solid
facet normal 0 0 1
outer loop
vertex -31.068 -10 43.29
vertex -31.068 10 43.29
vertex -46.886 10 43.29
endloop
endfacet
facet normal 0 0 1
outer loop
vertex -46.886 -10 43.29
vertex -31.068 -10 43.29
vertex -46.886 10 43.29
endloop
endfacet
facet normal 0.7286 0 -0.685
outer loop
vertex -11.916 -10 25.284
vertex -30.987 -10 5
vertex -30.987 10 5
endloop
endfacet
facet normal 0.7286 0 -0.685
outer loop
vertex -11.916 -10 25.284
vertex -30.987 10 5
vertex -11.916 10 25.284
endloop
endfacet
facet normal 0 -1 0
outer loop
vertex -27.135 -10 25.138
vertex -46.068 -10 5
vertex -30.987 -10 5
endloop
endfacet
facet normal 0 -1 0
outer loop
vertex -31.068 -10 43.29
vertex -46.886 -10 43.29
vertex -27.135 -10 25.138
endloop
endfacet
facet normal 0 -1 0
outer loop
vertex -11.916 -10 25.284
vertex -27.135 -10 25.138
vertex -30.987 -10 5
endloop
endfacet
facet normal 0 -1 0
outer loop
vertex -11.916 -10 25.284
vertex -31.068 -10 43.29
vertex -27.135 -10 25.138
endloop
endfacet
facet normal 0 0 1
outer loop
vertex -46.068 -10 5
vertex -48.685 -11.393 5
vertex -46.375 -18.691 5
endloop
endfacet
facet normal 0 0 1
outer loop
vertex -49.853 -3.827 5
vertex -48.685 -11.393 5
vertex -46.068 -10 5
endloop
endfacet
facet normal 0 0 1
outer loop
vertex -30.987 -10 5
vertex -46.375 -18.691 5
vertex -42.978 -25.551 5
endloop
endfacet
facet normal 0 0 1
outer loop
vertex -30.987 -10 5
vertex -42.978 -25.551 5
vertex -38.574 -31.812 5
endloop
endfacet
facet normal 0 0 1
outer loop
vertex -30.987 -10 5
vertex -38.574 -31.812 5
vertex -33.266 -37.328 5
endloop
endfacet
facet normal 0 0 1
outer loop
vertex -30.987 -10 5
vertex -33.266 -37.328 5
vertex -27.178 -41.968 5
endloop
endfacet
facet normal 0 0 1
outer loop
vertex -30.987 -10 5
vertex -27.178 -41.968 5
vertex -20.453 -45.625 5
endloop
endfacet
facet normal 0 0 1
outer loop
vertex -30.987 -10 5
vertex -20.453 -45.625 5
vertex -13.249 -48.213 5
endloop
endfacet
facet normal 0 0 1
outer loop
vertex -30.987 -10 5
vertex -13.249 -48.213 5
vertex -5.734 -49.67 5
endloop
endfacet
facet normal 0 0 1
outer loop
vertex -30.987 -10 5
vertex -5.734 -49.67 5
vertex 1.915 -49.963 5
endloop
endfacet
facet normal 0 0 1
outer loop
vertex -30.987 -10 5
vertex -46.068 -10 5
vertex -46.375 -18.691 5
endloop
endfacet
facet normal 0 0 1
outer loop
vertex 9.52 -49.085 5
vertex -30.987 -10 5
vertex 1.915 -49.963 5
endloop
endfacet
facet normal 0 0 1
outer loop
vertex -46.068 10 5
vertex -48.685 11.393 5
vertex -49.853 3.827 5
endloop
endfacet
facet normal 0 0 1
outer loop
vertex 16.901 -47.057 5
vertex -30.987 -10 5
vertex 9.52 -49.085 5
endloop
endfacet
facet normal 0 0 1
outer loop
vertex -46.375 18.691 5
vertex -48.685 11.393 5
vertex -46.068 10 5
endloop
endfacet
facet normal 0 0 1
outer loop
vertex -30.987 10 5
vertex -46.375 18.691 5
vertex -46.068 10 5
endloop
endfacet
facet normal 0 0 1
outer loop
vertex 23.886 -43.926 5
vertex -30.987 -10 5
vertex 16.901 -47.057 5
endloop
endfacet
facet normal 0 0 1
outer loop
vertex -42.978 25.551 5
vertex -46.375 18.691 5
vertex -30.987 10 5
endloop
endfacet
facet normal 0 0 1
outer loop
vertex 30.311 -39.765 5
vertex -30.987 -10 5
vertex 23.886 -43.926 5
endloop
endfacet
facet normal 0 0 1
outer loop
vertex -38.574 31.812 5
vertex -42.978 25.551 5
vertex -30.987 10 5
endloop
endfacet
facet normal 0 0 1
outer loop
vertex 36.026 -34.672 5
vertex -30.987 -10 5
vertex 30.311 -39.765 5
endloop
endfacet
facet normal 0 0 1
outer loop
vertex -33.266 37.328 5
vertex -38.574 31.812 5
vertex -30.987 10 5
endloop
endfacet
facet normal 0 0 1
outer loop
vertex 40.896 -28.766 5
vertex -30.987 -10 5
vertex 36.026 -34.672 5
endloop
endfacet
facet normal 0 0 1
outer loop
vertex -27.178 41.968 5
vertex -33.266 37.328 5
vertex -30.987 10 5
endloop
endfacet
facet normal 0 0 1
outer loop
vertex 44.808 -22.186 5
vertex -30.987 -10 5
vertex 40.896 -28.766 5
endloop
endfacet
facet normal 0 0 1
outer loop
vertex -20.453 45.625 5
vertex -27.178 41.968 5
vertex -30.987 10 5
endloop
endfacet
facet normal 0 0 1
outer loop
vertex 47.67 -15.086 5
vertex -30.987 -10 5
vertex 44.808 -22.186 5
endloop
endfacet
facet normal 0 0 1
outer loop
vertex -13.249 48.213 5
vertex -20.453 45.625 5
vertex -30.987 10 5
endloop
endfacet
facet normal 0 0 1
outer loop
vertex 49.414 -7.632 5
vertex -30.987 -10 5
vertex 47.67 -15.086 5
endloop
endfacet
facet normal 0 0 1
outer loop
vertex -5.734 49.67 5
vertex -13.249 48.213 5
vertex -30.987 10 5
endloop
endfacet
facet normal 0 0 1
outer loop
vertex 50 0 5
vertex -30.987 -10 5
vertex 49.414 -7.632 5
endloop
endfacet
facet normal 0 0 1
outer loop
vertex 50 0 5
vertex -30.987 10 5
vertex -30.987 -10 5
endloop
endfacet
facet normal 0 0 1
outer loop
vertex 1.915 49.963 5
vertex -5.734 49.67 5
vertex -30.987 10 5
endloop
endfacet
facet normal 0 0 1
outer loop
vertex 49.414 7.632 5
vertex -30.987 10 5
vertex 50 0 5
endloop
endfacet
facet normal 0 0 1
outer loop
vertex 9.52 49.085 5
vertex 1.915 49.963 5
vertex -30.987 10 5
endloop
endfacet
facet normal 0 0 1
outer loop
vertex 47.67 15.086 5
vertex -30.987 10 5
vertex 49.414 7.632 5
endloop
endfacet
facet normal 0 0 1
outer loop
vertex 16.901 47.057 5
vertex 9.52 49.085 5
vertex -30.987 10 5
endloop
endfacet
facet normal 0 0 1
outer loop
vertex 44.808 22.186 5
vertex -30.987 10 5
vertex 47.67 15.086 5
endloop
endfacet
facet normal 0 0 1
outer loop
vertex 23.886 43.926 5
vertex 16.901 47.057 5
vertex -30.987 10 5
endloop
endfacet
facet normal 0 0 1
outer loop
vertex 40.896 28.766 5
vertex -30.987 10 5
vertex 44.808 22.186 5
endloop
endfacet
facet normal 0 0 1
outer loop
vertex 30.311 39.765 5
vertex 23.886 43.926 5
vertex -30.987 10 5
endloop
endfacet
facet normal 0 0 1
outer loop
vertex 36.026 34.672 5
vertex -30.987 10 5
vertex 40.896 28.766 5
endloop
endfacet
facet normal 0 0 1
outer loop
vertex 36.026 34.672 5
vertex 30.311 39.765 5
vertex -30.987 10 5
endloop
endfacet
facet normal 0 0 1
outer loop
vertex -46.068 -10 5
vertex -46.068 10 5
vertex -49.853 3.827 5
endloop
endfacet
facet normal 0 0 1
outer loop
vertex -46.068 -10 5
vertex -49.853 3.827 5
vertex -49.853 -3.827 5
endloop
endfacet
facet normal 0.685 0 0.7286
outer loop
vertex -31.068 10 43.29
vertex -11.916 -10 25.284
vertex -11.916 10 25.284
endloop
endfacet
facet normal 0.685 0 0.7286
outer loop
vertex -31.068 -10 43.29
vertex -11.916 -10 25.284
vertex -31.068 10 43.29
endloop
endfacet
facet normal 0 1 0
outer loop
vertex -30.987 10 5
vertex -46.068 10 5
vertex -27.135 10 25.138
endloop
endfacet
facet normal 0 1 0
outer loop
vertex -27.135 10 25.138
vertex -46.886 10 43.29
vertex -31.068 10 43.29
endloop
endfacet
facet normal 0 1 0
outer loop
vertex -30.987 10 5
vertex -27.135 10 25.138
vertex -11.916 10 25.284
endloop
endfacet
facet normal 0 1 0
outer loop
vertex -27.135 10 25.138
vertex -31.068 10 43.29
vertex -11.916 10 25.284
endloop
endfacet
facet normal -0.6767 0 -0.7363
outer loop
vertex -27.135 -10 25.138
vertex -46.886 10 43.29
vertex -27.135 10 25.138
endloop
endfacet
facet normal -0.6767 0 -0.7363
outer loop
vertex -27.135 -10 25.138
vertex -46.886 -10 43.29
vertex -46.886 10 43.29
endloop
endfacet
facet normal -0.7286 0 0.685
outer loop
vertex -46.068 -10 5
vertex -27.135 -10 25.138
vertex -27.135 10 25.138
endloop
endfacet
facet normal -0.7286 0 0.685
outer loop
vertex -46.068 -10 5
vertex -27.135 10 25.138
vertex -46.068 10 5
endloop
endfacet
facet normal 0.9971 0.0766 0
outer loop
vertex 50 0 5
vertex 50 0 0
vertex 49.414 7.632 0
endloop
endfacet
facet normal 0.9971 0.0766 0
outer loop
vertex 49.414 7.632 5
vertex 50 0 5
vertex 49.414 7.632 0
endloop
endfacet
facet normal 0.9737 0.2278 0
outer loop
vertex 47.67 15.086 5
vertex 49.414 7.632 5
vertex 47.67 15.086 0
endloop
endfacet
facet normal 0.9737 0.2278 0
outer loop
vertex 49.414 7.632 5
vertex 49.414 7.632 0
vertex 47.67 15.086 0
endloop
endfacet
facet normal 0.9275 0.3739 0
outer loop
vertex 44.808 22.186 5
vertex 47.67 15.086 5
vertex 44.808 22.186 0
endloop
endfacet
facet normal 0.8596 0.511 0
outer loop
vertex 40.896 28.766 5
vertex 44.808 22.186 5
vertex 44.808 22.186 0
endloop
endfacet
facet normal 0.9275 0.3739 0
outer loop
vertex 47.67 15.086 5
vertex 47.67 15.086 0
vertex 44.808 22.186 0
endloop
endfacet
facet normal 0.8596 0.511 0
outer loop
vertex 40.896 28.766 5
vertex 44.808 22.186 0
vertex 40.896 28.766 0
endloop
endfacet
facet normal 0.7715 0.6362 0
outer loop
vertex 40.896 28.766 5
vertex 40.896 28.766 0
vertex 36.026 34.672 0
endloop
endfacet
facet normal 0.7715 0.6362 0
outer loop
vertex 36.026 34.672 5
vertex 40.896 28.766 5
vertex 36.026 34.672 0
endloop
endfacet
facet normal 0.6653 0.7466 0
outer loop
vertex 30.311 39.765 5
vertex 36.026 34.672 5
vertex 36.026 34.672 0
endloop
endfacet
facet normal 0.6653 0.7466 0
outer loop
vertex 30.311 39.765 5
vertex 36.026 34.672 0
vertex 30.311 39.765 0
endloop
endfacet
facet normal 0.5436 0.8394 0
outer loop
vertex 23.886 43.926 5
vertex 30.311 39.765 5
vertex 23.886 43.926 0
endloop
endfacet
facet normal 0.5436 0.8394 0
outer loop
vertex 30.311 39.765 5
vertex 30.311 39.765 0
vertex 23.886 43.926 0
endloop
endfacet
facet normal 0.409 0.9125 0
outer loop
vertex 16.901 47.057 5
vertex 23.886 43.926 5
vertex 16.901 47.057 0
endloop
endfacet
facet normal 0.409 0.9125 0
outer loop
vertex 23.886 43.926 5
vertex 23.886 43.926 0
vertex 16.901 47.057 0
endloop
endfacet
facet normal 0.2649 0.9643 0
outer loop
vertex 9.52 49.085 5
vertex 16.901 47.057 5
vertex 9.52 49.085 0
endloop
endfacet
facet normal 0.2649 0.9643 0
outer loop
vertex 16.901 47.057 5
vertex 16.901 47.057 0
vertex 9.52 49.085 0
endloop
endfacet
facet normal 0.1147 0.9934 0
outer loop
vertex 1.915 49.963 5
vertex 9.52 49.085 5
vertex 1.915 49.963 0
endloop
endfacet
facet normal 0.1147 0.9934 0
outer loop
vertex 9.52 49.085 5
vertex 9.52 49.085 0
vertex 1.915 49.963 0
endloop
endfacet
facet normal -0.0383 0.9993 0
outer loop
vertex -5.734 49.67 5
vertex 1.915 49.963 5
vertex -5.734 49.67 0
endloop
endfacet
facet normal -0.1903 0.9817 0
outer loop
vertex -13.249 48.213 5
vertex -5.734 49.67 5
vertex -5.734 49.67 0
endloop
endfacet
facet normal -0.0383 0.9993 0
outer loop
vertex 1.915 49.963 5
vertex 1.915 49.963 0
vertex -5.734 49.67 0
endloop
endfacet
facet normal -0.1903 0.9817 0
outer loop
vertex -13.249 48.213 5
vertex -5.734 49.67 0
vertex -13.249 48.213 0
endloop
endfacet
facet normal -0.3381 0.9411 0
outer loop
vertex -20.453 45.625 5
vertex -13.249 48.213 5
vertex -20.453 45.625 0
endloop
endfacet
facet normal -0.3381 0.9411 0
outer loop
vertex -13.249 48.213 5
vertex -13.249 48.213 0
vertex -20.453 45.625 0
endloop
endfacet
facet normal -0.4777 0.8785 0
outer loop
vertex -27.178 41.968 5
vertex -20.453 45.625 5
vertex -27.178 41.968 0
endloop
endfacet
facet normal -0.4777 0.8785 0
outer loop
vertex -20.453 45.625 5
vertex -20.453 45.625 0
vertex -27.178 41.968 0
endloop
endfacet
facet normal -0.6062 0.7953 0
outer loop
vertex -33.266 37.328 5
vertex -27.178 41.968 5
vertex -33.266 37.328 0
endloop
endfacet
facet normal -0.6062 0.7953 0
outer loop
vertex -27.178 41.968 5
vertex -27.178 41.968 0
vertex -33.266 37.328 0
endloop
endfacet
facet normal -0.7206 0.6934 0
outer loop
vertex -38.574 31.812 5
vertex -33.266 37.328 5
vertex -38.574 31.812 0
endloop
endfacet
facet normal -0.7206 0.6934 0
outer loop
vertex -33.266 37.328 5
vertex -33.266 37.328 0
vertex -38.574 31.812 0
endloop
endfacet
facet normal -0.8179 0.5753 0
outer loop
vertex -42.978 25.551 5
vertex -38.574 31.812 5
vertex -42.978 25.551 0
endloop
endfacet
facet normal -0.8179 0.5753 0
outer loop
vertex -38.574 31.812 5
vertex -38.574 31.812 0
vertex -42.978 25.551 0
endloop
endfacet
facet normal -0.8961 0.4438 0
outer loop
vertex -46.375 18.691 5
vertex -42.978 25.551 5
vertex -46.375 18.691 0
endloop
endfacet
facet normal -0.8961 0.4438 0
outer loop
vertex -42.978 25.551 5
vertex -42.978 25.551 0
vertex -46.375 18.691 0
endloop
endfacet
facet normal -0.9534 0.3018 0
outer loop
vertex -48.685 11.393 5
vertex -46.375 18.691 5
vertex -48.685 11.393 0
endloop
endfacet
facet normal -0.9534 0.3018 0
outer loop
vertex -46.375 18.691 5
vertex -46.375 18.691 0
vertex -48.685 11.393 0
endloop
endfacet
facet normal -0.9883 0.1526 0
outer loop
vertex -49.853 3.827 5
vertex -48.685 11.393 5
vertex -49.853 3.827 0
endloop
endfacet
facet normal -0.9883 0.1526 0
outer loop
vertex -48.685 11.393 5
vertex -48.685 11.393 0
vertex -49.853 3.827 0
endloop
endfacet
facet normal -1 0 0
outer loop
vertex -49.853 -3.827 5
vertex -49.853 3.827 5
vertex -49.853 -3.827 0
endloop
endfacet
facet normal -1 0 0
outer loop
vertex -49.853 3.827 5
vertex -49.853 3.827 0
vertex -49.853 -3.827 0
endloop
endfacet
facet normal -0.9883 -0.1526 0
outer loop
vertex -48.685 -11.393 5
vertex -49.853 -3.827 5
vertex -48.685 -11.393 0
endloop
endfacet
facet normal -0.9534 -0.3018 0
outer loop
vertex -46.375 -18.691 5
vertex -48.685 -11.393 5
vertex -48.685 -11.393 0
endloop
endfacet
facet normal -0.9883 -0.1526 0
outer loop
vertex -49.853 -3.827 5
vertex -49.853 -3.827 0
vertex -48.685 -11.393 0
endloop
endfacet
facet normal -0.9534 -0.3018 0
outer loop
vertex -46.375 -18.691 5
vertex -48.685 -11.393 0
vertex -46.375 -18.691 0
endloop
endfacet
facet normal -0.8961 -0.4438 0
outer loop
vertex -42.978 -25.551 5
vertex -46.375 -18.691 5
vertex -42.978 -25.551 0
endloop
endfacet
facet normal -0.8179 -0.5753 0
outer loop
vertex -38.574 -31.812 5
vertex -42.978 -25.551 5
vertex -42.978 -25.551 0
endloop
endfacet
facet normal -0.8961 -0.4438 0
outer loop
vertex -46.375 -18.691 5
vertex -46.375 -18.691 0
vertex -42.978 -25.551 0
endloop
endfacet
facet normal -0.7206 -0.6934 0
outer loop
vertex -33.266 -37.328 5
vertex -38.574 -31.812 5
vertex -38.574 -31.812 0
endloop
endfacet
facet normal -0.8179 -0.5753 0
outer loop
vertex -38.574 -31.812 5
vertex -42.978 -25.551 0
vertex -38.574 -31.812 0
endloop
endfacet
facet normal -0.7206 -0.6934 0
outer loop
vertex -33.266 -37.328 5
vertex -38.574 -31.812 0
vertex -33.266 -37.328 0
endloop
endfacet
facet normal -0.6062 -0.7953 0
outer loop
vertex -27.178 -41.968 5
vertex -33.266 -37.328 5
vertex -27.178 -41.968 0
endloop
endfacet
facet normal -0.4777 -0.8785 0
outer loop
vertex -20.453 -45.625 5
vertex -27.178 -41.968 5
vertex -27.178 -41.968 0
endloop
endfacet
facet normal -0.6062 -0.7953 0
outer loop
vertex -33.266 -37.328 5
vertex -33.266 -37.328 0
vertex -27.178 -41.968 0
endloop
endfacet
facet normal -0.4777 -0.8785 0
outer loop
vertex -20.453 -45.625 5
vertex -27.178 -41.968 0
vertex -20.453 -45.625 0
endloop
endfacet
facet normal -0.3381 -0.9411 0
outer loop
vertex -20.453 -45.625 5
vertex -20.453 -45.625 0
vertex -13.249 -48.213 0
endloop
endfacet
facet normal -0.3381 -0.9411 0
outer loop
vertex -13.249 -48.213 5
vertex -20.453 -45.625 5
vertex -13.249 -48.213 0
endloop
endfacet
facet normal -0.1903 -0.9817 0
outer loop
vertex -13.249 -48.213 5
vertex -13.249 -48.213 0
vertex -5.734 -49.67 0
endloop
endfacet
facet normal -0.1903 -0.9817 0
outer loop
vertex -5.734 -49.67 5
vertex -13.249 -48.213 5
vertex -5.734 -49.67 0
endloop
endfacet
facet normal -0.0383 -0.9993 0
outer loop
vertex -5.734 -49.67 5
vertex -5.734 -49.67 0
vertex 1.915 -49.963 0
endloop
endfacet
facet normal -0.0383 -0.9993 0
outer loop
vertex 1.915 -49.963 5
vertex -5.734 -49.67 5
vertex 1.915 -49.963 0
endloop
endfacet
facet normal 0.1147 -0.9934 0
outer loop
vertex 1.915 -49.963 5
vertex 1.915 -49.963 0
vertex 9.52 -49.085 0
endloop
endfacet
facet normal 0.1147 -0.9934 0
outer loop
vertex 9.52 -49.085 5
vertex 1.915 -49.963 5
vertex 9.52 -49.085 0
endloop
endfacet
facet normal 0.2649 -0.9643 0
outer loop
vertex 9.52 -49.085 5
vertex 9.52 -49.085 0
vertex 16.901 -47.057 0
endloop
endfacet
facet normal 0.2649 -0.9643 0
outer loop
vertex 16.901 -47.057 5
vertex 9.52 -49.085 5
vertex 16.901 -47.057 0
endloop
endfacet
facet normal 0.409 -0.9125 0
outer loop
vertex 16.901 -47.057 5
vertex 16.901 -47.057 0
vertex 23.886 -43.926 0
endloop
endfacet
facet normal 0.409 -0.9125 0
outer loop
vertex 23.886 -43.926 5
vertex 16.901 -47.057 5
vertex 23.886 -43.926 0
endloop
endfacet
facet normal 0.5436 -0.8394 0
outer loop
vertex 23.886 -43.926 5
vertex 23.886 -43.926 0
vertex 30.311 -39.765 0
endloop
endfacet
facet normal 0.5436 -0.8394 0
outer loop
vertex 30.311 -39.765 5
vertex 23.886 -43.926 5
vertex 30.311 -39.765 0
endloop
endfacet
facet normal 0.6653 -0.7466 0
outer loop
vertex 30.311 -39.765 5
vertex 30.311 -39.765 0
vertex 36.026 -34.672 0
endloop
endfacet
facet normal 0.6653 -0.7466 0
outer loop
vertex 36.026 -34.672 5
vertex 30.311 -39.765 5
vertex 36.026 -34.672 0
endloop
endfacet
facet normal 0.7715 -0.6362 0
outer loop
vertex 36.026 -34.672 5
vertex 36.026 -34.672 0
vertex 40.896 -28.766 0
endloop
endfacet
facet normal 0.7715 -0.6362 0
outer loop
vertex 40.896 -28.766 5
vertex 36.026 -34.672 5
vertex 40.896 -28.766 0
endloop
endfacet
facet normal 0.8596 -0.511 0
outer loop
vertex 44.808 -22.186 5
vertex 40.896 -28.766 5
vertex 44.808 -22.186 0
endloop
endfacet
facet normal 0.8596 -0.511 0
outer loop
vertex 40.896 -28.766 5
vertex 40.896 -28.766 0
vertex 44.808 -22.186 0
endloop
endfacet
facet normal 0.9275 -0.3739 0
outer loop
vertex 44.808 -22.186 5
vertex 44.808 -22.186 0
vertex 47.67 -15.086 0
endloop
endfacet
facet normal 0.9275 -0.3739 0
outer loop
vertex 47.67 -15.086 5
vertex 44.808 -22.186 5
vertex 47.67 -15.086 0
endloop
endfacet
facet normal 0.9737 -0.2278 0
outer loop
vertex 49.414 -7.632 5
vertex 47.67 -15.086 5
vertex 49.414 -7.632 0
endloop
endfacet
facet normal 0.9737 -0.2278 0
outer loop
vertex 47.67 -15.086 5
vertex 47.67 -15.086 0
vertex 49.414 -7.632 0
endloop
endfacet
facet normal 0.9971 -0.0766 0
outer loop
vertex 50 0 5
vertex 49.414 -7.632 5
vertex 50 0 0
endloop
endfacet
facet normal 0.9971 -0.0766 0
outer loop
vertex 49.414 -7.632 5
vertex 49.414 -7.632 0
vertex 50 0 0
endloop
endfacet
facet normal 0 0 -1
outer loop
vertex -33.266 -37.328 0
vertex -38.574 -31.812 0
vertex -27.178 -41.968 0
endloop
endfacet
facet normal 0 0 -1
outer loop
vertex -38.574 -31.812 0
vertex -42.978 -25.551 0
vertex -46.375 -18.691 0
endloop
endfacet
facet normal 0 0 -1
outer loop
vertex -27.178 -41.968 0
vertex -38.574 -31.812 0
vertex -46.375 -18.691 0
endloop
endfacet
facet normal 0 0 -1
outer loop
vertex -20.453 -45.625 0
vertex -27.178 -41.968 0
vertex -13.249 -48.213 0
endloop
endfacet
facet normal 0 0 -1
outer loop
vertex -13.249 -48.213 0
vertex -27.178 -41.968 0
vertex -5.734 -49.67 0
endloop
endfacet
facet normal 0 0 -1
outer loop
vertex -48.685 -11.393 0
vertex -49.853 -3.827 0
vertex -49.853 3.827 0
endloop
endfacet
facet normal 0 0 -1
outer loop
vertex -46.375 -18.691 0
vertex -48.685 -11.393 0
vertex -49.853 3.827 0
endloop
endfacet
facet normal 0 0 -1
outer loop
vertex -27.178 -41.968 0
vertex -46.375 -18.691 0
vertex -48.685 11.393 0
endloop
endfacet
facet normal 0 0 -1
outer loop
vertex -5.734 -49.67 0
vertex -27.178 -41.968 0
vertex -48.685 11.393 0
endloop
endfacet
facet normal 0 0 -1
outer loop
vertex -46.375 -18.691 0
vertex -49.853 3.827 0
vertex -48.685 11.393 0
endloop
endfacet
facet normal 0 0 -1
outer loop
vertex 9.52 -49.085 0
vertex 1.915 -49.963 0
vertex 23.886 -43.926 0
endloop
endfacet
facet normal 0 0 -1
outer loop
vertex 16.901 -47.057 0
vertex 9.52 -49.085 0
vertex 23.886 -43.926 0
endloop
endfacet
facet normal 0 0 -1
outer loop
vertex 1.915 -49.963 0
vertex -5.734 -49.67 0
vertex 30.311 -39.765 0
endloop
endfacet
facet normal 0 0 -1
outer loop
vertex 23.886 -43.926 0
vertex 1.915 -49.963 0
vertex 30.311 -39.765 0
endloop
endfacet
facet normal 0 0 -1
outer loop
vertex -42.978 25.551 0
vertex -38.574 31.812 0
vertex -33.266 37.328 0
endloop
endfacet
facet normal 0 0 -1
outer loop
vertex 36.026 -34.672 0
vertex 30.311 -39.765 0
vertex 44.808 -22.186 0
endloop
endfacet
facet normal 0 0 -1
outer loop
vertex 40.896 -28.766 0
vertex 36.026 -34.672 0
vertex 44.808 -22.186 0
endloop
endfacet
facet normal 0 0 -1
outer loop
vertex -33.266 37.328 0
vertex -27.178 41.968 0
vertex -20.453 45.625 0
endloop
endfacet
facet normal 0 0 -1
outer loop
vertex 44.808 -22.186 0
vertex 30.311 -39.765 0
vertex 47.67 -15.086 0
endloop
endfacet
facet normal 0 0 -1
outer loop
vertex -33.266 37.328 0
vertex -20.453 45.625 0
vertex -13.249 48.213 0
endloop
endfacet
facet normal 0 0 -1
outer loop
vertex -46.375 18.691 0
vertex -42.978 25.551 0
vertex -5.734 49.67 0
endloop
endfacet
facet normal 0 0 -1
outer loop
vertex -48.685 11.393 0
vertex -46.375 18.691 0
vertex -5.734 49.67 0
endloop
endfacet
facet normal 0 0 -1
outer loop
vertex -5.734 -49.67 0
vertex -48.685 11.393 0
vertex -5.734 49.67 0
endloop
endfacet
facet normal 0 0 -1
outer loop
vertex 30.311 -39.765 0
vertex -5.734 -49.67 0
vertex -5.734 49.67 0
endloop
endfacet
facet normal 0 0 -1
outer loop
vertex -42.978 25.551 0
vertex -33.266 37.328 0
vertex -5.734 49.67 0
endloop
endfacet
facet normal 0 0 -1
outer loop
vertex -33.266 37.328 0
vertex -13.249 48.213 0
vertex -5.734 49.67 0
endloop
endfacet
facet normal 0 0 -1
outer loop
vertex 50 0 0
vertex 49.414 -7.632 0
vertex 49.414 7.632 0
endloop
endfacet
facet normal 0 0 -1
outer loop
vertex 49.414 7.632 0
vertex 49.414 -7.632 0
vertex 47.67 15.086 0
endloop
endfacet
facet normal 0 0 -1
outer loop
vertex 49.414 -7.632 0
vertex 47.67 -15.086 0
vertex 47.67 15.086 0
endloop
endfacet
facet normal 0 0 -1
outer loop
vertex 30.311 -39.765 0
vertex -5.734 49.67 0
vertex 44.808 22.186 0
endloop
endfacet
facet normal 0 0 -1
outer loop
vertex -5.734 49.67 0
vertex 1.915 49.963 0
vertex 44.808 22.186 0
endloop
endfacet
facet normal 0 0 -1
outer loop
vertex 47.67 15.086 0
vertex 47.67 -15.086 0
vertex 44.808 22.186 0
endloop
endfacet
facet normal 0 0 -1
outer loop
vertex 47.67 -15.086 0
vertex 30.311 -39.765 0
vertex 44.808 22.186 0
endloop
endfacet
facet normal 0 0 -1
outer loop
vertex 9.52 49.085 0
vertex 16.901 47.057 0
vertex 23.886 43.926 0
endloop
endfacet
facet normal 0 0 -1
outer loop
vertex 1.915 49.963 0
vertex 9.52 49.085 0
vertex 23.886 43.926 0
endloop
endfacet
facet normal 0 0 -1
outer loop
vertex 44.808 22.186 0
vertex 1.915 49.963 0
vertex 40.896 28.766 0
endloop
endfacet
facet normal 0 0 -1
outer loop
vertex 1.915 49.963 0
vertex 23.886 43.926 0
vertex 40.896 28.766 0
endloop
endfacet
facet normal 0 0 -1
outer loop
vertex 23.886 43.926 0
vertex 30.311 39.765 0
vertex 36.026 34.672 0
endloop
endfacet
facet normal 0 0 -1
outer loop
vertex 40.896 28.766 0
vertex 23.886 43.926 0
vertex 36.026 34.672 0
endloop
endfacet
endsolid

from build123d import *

# Parameters (mm, degrees)
F2_R     = 50
F3_DEPTH = 5
F6_DEPTH = 10


with BuildPart() as f3:
    # F2 (on face) → F3 (new body)
    with BuildSketch(Plane.XY):
        Circle(F2_R)
    extrude(amount=F3_DEPTH)

    # F5 (on face) → F6 (join, symmetric)
    with BuildSketch(Plane.XZ):
        Polygon((-46.88603, 43.289871), (-27.134711, 25.138109), (-46.067975, 5), (-30.987105, 5), (-11.916471, 25.284221), (-31.067937, 43.289871), align=None)
    extrude(amount=F6_DEPTH, both=True)


solid = f3.part
